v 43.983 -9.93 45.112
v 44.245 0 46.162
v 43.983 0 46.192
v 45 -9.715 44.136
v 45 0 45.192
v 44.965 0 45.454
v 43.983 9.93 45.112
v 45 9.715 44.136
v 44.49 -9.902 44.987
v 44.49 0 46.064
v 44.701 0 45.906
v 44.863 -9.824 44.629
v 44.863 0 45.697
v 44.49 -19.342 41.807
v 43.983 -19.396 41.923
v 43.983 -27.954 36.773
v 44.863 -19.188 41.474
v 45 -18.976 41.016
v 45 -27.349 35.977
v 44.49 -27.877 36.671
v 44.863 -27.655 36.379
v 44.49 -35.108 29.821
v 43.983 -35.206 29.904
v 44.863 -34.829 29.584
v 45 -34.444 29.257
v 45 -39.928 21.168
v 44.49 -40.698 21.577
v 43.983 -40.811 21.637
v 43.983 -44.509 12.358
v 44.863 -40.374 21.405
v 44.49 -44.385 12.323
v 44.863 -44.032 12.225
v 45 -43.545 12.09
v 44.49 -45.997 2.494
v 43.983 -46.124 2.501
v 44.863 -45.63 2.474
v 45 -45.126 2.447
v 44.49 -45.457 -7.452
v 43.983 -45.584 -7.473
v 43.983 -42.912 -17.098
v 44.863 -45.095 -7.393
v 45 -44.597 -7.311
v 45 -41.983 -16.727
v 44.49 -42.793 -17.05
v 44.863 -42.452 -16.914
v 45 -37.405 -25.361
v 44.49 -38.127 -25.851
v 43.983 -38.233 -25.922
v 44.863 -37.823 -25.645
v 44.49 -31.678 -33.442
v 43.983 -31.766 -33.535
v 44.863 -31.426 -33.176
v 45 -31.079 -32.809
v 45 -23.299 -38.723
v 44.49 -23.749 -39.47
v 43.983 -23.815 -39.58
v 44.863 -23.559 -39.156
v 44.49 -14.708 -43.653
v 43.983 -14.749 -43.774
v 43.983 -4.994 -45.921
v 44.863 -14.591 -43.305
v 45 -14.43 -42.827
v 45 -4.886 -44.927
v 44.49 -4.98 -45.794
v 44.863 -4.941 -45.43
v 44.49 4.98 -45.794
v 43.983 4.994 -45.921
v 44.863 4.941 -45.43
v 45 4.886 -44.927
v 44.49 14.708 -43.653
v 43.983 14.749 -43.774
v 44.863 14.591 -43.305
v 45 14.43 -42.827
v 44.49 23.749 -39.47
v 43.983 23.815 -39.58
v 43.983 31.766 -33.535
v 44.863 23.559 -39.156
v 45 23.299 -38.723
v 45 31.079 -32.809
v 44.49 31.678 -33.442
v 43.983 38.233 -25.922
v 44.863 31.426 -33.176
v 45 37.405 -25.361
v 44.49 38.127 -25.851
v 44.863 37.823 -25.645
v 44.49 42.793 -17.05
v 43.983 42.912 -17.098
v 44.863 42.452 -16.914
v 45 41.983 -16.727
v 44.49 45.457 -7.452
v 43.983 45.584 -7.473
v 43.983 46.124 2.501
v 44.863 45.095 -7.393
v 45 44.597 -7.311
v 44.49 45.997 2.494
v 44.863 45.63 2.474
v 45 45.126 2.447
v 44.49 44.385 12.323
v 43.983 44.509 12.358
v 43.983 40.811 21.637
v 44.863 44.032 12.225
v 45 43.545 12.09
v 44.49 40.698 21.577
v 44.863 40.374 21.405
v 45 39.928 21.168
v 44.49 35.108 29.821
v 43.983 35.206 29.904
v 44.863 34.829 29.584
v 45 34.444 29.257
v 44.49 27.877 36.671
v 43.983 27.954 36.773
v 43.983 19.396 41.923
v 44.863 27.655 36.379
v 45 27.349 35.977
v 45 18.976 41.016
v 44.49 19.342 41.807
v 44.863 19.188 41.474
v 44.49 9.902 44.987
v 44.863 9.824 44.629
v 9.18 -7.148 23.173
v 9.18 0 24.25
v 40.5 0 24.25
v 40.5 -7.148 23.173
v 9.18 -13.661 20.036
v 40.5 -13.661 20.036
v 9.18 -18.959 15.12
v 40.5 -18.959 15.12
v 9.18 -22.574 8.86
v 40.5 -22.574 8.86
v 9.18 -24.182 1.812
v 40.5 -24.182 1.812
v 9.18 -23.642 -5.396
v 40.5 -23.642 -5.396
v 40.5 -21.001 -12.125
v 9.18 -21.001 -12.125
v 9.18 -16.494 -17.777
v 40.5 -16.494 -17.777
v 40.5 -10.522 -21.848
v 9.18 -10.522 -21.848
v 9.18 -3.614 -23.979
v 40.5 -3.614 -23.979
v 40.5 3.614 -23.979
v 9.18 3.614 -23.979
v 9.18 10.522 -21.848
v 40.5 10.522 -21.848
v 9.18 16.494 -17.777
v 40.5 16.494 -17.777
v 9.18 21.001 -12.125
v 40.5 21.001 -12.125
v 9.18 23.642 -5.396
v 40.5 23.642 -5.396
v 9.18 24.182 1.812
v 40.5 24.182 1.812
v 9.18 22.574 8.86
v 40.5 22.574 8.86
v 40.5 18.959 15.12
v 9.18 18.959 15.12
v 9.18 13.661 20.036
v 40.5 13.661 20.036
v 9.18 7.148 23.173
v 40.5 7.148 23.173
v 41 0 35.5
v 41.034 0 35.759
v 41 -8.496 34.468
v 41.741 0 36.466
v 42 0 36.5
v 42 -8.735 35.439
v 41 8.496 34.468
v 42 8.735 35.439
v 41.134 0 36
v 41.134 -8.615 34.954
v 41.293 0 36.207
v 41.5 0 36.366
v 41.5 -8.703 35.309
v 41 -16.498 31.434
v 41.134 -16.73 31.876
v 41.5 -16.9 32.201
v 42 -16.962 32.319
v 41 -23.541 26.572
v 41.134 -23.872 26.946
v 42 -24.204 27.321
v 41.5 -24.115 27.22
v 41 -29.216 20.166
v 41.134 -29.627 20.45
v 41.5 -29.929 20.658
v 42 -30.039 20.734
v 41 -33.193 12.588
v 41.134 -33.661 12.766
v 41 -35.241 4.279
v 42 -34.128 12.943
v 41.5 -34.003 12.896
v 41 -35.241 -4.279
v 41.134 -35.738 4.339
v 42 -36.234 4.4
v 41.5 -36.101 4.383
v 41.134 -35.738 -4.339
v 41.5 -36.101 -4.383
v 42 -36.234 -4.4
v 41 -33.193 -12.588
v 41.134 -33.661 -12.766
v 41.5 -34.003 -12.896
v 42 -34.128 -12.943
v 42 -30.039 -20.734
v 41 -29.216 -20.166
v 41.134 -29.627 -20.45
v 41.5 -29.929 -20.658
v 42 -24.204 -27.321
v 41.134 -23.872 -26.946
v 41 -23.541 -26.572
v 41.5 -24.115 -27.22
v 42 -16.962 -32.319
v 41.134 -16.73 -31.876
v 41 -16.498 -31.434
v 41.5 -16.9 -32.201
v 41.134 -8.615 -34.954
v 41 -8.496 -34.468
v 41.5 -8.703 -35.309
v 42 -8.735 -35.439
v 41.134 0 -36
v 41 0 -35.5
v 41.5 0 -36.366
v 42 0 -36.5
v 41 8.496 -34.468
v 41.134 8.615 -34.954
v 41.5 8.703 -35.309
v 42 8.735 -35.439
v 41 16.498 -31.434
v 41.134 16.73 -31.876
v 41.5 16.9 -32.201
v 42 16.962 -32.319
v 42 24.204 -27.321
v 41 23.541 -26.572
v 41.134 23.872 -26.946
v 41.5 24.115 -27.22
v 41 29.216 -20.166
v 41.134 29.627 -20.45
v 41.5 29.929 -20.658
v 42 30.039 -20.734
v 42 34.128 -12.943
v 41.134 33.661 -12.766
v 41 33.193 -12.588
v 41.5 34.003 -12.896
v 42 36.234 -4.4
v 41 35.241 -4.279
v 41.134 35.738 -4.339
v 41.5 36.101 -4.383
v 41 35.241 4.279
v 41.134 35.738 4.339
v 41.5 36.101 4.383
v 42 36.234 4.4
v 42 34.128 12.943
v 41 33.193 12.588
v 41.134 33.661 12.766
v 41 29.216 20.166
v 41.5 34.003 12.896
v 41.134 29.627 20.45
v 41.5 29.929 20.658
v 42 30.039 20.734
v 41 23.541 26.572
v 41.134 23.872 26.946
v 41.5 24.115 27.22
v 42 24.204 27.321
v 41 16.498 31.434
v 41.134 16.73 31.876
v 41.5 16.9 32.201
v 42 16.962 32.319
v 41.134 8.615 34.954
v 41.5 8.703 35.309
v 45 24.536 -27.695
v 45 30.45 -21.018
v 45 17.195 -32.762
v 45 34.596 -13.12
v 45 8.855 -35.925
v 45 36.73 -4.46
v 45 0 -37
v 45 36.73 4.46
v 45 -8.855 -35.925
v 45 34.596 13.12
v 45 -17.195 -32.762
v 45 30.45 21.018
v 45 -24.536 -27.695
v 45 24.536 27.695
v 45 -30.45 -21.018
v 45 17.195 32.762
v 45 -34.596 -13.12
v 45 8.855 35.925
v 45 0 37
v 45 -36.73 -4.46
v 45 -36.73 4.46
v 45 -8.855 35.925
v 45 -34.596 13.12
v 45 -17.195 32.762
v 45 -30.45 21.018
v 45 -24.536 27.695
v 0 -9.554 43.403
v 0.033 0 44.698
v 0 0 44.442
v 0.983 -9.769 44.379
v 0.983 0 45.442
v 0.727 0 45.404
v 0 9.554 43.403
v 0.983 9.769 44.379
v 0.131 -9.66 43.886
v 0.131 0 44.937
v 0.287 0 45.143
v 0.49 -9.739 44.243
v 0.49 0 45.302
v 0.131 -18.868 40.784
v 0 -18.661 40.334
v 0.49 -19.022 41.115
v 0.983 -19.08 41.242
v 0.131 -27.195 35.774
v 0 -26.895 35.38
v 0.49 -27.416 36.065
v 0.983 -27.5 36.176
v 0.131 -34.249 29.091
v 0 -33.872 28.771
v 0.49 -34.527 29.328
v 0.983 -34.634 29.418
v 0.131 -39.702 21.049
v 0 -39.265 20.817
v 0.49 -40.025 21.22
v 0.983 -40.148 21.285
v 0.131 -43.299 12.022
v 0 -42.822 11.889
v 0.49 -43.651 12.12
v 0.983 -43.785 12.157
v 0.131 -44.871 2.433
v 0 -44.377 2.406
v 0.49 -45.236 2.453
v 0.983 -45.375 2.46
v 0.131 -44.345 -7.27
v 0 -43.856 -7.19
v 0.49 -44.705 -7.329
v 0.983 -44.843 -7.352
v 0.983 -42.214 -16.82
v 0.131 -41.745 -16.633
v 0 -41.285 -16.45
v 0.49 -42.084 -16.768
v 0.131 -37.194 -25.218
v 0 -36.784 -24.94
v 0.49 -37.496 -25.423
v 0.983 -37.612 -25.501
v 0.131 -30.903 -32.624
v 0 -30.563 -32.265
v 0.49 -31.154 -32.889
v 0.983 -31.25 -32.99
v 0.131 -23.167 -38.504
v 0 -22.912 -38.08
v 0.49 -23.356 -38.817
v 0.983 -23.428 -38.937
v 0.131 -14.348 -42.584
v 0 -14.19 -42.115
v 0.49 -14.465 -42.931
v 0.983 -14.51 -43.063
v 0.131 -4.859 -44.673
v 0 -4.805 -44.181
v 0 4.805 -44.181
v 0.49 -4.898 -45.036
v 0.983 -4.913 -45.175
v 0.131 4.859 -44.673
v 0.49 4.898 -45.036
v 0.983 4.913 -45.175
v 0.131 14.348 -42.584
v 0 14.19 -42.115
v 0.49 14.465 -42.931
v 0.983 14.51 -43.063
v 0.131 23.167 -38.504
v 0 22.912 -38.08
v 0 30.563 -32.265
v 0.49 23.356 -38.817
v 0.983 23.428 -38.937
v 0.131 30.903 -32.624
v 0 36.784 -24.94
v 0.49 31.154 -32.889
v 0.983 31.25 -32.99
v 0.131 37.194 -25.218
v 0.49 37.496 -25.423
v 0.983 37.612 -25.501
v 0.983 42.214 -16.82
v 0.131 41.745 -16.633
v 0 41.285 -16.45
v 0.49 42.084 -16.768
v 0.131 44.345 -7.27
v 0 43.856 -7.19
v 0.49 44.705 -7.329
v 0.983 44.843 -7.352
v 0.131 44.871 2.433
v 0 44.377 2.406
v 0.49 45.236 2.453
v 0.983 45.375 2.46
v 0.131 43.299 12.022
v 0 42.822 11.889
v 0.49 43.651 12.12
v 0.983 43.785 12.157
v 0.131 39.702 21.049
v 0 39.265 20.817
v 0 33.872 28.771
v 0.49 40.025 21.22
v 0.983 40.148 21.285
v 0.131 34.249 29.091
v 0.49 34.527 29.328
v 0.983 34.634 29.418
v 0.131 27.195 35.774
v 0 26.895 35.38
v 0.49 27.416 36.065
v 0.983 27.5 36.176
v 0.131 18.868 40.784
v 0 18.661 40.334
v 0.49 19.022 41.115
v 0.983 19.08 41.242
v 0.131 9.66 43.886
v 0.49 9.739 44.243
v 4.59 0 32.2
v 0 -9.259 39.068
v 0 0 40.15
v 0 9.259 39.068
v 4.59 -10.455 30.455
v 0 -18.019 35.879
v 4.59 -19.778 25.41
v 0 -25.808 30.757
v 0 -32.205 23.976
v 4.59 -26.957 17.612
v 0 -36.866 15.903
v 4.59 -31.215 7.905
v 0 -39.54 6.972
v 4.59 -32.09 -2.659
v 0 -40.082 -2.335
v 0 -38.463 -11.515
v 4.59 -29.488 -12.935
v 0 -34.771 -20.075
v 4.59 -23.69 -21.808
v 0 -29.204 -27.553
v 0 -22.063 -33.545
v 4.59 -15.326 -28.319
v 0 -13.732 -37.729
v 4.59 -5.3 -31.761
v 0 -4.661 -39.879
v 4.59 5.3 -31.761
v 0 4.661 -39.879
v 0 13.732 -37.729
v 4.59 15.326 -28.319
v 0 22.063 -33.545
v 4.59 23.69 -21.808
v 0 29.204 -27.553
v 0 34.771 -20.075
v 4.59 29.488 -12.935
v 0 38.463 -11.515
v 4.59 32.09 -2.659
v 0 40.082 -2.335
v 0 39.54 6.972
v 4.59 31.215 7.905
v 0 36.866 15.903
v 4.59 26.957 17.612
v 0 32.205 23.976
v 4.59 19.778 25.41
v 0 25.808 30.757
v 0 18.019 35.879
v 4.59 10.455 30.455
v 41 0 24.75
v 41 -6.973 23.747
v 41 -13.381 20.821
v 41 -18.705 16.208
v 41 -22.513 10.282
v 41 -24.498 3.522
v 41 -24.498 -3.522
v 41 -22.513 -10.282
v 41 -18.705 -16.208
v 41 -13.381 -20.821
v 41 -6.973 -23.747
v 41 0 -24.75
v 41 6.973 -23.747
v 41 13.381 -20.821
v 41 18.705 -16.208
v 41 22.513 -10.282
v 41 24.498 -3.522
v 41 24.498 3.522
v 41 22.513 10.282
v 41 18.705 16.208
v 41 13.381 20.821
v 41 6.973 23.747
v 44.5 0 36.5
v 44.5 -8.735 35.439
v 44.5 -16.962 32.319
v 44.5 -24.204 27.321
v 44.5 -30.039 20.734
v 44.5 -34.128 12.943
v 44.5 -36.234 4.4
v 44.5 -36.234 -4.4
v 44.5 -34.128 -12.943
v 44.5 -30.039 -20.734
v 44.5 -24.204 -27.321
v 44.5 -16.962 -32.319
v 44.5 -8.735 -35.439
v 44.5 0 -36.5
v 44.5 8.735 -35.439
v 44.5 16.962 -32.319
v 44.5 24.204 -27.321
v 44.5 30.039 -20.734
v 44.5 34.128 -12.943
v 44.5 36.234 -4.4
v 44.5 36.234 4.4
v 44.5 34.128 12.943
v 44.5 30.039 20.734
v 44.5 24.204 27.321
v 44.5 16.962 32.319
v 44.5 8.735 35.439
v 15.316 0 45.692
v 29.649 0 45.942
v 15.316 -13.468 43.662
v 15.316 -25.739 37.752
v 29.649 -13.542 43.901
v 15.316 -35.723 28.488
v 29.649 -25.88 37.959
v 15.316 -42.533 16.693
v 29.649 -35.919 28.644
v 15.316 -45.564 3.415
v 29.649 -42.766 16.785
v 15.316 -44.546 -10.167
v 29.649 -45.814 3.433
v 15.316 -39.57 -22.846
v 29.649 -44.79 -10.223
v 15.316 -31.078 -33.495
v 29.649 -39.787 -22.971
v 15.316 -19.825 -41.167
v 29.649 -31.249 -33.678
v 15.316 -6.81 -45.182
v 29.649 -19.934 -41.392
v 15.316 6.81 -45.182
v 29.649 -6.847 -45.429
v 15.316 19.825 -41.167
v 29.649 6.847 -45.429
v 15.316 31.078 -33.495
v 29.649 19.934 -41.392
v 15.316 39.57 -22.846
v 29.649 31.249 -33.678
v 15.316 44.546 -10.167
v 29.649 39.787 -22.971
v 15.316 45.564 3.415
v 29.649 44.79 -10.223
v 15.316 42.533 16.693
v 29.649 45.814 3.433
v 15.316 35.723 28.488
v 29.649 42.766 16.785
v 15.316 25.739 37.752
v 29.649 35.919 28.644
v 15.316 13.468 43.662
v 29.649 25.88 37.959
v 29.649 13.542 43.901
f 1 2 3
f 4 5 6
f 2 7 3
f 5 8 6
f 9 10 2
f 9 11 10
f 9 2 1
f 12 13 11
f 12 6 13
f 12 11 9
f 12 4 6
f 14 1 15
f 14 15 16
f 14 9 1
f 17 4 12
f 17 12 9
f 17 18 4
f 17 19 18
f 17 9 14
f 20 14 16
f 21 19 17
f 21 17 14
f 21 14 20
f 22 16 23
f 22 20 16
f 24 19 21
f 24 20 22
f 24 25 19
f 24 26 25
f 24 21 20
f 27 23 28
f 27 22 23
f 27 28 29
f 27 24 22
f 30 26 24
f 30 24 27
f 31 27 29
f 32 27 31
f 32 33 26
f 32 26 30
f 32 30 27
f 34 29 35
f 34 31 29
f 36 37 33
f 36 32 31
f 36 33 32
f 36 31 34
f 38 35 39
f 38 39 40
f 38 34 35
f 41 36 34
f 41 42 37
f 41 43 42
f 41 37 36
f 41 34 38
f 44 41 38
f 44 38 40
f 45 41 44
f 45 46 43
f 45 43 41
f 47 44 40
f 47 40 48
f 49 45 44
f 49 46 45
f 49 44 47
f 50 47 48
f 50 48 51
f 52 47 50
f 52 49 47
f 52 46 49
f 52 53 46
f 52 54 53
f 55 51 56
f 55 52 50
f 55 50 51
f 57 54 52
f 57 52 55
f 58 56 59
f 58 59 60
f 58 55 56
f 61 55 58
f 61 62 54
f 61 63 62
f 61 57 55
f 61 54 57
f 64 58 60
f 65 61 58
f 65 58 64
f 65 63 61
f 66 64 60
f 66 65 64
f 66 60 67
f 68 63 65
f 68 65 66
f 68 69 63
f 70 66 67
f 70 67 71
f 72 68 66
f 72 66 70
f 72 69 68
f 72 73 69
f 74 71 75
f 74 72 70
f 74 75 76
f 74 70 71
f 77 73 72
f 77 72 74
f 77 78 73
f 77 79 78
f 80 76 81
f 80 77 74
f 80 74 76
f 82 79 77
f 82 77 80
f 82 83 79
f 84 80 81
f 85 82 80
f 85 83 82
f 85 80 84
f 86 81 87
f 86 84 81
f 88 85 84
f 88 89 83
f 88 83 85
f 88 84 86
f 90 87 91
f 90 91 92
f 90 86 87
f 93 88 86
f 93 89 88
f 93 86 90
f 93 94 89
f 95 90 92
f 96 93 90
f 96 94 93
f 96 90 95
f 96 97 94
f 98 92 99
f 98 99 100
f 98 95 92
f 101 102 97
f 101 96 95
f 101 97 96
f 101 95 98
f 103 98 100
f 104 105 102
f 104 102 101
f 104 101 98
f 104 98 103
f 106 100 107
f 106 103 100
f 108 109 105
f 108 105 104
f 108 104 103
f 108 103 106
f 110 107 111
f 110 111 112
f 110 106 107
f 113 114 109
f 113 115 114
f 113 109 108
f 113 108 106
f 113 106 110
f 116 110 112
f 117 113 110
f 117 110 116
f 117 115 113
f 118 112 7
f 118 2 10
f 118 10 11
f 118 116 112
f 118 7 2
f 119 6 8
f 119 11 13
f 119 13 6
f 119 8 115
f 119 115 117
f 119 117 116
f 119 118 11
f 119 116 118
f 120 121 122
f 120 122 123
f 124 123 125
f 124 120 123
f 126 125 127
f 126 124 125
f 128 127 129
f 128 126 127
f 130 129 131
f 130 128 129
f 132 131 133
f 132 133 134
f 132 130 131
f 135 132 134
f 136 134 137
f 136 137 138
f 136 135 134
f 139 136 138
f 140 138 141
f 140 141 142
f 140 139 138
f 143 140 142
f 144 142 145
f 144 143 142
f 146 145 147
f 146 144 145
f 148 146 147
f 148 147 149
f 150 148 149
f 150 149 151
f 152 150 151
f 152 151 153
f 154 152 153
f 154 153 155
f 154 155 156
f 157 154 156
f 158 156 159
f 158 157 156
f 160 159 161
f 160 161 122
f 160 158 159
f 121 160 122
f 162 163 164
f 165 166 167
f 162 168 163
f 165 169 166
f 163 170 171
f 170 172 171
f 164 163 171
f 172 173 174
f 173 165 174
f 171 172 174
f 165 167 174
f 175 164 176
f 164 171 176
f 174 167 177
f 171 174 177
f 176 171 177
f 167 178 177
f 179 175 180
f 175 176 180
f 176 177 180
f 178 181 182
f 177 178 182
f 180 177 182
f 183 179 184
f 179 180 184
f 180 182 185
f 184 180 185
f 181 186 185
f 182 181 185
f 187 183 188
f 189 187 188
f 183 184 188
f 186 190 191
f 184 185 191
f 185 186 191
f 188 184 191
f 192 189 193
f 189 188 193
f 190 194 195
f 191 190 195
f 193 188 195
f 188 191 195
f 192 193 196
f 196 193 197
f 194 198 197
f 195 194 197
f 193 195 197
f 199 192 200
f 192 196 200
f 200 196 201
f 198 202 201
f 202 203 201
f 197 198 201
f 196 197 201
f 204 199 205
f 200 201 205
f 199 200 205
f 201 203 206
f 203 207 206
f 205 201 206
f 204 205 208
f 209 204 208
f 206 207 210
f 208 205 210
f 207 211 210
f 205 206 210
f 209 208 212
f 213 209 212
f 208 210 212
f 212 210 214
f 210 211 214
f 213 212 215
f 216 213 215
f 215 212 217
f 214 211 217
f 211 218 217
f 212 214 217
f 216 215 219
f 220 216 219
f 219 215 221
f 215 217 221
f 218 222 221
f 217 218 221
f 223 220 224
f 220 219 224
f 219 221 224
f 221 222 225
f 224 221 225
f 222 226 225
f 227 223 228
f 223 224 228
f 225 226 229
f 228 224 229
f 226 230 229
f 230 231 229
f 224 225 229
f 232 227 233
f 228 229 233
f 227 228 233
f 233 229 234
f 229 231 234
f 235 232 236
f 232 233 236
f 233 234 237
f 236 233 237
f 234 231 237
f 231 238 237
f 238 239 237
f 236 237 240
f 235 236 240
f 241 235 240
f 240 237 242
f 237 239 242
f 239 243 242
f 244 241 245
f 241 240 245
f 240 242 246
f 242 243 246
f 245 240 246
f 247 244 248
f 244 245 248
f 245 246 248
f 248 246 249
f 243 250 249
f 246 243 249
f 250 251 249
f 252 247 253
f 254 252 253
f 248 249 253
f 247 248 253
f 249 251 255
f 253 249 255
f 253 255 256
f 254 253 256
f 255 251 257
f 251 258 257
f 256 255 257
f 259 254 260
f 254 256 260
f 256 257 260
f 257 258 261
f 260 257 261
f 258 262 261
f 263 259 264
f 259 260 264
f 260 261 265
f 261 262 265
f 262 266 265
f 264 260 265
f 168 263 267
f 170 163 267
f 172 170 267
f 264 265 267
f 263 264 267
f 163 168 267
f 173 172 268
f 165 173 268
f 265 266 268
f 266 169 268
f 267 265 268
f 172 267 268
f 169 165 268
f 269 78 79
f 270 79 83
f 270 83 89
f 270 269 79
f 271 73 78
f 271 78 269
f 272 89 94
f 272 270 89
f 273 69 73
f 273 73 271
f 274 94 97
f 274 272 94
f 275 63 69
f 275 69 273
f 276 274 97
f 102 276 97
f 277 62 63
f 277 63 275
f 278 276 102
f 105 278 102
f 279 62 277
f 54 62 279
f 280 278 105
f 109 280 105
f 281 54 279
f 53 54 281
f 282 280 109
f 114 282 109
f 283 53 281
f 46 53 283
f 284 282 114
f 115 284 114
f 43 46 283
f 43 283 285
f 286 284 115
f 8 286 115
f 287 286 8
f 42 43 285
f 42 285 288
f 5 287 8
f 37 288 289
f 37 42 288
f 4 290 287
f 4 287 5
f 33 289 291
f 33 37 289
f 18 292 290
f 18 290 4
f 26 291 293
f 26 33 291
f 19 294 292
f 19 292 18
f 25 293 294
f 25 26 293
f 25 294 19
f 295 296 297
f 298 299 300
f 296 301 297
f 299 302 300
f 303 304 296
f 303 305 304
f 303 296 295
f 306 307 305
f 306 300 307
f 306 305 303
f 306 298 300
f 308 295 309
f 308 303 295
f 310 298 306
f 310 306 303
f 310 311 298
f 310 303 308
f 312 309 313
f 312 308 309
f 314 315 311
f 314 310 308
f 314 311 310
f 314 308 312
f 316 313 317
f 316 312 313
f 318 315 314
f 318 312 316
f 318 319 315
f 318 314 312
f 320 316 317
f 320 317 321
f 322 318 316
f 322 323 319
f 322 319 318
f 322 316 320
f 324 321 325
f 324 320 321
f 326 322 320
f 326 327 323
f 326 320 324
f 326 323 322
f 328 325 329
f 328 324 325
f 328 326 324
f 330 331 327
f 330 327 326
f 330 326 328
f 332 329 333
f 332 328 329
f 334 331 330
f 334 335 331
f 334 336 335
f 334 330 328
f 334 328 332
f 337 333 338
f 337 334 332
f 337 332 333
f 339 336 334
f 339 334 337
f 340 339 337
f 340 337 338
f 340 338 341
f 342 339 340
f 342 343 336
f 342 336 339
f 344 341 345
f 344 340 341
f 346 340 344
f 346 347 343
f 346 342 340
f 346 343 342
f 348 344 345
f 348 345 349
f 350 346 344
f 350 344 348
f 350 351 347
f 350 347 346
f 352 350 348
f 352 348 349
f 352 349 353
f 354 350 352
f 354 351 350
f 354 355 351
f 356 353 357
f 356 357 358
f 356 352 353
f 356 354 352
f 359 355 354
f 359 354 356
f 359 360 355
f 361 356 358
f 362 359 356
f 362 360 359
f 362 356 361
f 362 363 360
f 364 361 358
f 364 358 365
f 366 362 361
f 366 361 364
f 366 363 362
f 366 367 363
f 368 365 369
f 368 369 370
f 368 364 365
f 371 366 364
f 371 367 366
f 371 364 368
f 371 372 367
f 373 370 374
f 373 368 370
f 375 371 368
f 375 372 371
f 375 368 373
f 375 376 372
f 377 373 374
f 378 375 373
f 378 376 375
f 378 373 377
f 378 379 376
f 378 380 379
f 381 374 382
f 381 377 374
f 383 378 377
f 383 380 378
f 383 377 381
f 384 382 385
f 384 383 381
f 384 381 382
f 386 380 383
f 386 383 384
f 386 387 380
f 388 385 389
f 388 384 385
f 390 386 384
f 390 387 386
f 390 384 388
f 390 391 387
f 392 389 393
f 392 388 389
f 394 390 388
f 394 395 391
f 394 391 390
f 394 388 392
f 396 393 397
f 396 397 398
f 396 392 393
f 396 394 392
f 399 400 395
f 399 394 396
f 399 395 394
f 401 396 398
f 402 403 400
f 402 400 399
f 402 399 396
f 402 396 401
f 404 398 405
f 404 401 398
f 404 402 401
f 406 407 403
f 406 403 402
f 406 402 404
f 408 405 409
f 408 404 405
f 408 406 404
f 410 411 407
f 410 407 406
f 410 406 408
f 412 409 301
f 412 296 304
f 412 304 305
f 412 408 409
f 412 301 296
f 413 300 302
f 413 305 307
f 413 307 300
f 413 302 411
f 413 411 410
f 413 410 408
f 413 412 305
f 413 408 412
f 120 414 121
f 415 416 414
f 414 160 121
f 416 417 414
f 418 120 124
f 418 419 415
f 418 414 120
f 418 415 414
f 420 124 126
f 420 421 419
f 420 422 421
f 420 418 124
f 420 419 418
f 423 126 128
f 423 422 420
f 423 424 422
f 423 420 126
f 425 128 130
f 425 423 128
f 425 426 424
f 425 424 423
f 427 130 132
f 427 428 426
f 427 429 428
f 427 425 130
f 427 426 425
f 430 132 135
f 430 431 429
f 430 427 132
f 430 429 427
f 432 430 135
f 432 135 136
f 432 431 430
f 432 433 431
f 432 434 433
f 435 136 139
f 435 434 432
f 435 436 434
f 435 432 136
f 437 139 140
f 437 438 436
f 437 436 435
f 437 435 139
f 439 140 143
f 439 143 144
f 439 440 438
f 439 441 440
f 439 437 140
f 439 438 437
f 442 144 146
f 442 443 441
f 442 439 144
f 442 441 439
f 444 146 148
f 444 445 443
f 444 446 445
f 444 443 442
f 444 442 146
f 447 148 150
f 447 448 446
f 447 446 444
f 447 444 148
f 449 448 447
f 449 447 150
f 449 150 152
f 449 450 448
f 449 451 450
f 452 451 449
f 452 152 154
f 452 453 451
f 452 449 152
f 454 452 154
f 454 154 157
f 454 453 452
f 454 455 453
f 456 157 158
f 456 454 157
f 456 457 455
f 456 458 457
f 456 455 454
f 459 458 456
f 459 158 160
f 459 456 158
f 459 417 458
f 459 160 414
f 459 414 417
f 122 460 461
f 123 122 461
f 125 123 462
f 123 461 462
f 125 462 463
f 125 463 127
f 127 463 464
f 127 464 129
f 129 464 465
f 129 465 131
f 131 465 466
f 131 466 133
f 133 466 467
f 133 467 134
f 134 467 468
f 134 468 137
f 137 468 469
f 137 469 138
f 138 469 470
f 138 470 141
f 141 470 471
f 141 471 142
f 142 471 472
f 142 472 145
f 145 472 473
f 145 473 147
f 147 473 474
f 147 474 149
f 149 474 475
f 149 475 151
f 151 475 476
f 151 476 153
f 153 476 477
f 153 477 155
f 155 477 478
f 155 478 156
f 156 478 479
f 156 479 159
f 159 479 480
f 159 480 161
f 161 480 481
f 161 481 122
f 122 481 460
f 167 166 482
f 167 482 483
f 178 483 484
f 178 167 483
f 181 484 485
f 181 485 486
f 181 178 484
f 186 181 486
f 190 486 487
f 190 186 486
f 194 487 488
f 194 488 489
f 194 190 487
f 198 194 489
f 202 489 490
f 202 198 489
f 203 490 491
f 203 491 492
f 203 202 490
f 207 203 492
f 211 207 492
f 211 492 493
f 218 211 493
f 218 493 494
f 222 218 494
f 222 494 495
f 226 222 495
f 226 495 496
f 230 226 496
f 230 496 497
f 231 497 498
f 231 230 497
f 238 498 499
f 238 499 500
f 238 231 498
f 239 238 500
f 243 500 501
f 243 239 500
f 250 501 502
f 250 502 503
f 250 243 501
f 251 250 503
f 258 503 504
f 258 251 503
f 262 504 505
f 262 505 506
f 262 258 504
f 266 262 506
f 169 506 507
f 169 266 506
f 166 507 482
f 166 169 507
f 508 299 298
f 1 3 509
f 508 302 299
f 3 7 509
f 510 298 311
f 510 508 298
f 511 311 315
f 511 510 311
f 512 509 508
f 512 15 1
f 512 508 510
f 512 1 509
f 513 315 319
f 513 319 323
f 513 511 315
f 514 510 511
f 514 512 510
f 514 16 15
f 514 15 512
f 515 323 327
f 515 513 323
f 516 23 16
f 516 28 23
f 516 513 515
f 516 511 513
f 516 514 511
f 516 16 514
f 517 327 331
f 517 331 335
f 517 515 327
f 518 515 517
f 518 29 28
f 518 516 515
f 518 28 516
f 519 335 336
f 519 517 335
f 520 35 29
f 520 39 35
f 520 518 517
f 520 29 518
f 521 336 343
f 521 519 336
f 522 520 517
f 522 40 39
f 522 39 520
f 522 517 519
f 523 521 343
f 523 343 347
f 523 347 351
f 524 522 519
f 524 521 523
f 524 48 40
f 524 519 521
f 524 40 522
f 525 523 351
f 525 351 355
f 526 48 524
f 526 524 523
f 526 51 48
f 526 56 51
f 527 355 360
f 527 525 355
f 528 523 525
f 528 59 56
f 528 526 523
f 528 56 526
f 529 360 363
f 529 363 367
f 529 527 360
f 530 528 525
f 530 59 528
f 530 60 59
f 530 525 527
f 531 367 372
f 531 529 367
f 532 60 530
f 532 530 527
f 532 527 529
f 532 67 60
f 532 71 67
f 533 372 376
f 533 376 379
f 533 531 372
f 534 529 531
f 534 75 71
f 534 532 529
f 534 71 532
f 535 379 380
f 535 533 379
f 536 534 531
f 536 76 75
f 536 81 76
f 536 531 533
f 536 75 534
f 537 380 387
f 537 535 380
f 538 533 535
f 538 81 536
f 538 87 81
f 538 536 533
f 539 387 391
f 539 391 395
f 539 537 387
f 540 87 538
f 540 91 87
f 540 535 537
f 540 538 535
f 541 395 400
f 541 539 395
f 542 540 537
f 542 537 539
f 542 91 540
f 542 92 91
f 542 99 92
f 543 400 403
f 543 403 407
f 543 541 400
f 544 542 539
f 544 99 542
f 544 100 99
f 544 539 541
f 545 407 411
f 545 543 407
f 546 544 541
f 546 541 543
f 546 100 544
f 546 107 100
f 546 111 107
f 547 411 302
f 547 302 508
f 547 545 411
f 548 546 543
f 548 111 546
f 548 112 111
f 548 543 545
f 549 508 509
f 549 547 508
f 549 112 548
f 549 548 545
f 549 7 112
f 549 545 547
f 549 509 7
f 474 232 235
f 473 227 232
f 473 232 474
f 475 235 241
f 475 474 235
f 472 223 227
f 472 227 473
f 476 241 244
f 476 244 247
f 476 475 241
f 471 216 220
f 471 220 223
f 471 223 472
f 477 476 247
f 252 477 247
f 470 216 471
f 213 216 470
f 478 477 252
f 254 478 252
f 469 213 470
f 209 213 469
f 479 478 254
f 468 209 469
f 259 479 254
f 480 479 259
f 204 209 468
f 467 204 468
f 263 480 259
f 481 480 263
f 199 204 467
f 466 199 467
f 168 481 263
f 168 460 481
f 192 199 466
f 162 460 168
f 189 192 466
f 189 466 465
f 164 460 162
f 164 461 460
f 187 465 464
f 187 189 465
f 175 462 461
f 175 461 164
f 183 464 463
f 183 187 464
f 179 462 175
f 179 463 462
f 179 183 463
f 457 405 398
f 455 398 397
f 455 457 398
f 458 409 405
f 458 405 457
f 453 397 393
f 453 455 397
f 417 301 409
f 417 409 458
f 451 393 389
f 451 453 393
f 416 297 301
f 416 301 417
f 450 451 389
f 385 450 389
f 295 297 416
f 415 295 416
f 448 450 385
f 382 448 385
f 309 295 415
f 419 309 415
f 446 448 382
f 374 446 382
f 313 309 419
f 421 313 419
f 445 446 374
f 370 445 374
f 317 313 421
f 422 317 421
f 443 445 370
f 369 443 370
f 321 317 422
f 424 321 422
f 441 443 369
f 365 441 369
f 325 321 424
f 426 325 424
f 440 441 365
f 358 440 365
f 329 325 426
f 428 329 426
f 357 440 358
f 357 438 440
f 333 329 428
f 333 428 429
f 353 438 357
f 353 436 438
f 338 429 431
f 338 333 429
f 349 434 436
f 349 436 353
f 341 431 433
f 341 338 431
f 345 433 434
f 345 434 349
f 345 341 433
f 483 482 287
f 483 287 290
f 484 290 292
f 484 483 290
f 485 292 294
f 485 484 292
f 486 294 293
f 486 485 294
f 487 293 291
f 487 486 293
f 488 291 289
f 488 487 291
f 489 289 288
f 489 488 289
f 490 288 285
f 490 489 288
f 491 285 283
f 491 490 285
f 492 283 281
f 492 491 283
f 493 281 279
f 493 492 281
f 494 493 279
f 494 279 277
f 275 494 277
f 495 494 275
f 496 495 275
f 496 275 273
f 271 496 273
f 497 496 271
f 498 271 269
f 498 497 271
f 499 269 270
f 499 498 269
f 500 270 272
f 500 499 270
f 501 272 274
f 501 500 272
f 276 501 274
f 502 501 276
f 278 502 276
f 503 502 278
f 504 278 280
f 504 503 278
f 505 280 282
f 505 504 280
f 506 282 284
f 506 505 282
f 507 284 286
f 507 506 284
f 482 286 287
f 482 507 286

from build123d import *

# Parameters (mm, degrees)
VERRUNDUNG1_R = 1
FASE1_SIZE    = 0.5
VERRUNDUNG2_R = 1


with BuildPart() as part:
    # Skizze1 → Rotation1 (revolve)
    with BuildSketch(Plane.XY, mode=Mode.PRIVATE) as rotation1_sk:
        Polygon((0, -40.15), (0, -45.424522078), (45, -46.21), (45, -36.5), (41, -36.5), (41, -24.25), (9.17986928, -24.25), align=None)
    revolve(rotation1_sk.sketch.rotate(Axis((0, 0, 0), (1, 0, 0)), 270), axis=Axis((0, 0, 0), (1, 0, 0)))  # turned: the seam where the file's is

    # Verrundung1
    verrundung1_edges = [part.edges().sort_by_distance(p)[0] for p in [
        (45, 0, -46.21),
        (0, 0, -45.424522078),
    ]]
    fillet(verrundung1_edges, radius=VERRUNDUNG1_R)

    # Fase1
    fase1_edges = [part.edges().sort_by_distance(p)[0] for p in [
        (41, 0, -24.25),
        (45, 0, -36.5),
    ]]
    chamfer(fase1_edges, length=FASE1_SIZE)

    # Verrundung2
    verrundung2_edges = [part.edges().sort_by_distance(p)[0] for p in [
        (41, 0, -36.5),
    ]]
    fillet(verrundung2_edges, radius=VERRUNDUNG2_R)


solid = part.part
